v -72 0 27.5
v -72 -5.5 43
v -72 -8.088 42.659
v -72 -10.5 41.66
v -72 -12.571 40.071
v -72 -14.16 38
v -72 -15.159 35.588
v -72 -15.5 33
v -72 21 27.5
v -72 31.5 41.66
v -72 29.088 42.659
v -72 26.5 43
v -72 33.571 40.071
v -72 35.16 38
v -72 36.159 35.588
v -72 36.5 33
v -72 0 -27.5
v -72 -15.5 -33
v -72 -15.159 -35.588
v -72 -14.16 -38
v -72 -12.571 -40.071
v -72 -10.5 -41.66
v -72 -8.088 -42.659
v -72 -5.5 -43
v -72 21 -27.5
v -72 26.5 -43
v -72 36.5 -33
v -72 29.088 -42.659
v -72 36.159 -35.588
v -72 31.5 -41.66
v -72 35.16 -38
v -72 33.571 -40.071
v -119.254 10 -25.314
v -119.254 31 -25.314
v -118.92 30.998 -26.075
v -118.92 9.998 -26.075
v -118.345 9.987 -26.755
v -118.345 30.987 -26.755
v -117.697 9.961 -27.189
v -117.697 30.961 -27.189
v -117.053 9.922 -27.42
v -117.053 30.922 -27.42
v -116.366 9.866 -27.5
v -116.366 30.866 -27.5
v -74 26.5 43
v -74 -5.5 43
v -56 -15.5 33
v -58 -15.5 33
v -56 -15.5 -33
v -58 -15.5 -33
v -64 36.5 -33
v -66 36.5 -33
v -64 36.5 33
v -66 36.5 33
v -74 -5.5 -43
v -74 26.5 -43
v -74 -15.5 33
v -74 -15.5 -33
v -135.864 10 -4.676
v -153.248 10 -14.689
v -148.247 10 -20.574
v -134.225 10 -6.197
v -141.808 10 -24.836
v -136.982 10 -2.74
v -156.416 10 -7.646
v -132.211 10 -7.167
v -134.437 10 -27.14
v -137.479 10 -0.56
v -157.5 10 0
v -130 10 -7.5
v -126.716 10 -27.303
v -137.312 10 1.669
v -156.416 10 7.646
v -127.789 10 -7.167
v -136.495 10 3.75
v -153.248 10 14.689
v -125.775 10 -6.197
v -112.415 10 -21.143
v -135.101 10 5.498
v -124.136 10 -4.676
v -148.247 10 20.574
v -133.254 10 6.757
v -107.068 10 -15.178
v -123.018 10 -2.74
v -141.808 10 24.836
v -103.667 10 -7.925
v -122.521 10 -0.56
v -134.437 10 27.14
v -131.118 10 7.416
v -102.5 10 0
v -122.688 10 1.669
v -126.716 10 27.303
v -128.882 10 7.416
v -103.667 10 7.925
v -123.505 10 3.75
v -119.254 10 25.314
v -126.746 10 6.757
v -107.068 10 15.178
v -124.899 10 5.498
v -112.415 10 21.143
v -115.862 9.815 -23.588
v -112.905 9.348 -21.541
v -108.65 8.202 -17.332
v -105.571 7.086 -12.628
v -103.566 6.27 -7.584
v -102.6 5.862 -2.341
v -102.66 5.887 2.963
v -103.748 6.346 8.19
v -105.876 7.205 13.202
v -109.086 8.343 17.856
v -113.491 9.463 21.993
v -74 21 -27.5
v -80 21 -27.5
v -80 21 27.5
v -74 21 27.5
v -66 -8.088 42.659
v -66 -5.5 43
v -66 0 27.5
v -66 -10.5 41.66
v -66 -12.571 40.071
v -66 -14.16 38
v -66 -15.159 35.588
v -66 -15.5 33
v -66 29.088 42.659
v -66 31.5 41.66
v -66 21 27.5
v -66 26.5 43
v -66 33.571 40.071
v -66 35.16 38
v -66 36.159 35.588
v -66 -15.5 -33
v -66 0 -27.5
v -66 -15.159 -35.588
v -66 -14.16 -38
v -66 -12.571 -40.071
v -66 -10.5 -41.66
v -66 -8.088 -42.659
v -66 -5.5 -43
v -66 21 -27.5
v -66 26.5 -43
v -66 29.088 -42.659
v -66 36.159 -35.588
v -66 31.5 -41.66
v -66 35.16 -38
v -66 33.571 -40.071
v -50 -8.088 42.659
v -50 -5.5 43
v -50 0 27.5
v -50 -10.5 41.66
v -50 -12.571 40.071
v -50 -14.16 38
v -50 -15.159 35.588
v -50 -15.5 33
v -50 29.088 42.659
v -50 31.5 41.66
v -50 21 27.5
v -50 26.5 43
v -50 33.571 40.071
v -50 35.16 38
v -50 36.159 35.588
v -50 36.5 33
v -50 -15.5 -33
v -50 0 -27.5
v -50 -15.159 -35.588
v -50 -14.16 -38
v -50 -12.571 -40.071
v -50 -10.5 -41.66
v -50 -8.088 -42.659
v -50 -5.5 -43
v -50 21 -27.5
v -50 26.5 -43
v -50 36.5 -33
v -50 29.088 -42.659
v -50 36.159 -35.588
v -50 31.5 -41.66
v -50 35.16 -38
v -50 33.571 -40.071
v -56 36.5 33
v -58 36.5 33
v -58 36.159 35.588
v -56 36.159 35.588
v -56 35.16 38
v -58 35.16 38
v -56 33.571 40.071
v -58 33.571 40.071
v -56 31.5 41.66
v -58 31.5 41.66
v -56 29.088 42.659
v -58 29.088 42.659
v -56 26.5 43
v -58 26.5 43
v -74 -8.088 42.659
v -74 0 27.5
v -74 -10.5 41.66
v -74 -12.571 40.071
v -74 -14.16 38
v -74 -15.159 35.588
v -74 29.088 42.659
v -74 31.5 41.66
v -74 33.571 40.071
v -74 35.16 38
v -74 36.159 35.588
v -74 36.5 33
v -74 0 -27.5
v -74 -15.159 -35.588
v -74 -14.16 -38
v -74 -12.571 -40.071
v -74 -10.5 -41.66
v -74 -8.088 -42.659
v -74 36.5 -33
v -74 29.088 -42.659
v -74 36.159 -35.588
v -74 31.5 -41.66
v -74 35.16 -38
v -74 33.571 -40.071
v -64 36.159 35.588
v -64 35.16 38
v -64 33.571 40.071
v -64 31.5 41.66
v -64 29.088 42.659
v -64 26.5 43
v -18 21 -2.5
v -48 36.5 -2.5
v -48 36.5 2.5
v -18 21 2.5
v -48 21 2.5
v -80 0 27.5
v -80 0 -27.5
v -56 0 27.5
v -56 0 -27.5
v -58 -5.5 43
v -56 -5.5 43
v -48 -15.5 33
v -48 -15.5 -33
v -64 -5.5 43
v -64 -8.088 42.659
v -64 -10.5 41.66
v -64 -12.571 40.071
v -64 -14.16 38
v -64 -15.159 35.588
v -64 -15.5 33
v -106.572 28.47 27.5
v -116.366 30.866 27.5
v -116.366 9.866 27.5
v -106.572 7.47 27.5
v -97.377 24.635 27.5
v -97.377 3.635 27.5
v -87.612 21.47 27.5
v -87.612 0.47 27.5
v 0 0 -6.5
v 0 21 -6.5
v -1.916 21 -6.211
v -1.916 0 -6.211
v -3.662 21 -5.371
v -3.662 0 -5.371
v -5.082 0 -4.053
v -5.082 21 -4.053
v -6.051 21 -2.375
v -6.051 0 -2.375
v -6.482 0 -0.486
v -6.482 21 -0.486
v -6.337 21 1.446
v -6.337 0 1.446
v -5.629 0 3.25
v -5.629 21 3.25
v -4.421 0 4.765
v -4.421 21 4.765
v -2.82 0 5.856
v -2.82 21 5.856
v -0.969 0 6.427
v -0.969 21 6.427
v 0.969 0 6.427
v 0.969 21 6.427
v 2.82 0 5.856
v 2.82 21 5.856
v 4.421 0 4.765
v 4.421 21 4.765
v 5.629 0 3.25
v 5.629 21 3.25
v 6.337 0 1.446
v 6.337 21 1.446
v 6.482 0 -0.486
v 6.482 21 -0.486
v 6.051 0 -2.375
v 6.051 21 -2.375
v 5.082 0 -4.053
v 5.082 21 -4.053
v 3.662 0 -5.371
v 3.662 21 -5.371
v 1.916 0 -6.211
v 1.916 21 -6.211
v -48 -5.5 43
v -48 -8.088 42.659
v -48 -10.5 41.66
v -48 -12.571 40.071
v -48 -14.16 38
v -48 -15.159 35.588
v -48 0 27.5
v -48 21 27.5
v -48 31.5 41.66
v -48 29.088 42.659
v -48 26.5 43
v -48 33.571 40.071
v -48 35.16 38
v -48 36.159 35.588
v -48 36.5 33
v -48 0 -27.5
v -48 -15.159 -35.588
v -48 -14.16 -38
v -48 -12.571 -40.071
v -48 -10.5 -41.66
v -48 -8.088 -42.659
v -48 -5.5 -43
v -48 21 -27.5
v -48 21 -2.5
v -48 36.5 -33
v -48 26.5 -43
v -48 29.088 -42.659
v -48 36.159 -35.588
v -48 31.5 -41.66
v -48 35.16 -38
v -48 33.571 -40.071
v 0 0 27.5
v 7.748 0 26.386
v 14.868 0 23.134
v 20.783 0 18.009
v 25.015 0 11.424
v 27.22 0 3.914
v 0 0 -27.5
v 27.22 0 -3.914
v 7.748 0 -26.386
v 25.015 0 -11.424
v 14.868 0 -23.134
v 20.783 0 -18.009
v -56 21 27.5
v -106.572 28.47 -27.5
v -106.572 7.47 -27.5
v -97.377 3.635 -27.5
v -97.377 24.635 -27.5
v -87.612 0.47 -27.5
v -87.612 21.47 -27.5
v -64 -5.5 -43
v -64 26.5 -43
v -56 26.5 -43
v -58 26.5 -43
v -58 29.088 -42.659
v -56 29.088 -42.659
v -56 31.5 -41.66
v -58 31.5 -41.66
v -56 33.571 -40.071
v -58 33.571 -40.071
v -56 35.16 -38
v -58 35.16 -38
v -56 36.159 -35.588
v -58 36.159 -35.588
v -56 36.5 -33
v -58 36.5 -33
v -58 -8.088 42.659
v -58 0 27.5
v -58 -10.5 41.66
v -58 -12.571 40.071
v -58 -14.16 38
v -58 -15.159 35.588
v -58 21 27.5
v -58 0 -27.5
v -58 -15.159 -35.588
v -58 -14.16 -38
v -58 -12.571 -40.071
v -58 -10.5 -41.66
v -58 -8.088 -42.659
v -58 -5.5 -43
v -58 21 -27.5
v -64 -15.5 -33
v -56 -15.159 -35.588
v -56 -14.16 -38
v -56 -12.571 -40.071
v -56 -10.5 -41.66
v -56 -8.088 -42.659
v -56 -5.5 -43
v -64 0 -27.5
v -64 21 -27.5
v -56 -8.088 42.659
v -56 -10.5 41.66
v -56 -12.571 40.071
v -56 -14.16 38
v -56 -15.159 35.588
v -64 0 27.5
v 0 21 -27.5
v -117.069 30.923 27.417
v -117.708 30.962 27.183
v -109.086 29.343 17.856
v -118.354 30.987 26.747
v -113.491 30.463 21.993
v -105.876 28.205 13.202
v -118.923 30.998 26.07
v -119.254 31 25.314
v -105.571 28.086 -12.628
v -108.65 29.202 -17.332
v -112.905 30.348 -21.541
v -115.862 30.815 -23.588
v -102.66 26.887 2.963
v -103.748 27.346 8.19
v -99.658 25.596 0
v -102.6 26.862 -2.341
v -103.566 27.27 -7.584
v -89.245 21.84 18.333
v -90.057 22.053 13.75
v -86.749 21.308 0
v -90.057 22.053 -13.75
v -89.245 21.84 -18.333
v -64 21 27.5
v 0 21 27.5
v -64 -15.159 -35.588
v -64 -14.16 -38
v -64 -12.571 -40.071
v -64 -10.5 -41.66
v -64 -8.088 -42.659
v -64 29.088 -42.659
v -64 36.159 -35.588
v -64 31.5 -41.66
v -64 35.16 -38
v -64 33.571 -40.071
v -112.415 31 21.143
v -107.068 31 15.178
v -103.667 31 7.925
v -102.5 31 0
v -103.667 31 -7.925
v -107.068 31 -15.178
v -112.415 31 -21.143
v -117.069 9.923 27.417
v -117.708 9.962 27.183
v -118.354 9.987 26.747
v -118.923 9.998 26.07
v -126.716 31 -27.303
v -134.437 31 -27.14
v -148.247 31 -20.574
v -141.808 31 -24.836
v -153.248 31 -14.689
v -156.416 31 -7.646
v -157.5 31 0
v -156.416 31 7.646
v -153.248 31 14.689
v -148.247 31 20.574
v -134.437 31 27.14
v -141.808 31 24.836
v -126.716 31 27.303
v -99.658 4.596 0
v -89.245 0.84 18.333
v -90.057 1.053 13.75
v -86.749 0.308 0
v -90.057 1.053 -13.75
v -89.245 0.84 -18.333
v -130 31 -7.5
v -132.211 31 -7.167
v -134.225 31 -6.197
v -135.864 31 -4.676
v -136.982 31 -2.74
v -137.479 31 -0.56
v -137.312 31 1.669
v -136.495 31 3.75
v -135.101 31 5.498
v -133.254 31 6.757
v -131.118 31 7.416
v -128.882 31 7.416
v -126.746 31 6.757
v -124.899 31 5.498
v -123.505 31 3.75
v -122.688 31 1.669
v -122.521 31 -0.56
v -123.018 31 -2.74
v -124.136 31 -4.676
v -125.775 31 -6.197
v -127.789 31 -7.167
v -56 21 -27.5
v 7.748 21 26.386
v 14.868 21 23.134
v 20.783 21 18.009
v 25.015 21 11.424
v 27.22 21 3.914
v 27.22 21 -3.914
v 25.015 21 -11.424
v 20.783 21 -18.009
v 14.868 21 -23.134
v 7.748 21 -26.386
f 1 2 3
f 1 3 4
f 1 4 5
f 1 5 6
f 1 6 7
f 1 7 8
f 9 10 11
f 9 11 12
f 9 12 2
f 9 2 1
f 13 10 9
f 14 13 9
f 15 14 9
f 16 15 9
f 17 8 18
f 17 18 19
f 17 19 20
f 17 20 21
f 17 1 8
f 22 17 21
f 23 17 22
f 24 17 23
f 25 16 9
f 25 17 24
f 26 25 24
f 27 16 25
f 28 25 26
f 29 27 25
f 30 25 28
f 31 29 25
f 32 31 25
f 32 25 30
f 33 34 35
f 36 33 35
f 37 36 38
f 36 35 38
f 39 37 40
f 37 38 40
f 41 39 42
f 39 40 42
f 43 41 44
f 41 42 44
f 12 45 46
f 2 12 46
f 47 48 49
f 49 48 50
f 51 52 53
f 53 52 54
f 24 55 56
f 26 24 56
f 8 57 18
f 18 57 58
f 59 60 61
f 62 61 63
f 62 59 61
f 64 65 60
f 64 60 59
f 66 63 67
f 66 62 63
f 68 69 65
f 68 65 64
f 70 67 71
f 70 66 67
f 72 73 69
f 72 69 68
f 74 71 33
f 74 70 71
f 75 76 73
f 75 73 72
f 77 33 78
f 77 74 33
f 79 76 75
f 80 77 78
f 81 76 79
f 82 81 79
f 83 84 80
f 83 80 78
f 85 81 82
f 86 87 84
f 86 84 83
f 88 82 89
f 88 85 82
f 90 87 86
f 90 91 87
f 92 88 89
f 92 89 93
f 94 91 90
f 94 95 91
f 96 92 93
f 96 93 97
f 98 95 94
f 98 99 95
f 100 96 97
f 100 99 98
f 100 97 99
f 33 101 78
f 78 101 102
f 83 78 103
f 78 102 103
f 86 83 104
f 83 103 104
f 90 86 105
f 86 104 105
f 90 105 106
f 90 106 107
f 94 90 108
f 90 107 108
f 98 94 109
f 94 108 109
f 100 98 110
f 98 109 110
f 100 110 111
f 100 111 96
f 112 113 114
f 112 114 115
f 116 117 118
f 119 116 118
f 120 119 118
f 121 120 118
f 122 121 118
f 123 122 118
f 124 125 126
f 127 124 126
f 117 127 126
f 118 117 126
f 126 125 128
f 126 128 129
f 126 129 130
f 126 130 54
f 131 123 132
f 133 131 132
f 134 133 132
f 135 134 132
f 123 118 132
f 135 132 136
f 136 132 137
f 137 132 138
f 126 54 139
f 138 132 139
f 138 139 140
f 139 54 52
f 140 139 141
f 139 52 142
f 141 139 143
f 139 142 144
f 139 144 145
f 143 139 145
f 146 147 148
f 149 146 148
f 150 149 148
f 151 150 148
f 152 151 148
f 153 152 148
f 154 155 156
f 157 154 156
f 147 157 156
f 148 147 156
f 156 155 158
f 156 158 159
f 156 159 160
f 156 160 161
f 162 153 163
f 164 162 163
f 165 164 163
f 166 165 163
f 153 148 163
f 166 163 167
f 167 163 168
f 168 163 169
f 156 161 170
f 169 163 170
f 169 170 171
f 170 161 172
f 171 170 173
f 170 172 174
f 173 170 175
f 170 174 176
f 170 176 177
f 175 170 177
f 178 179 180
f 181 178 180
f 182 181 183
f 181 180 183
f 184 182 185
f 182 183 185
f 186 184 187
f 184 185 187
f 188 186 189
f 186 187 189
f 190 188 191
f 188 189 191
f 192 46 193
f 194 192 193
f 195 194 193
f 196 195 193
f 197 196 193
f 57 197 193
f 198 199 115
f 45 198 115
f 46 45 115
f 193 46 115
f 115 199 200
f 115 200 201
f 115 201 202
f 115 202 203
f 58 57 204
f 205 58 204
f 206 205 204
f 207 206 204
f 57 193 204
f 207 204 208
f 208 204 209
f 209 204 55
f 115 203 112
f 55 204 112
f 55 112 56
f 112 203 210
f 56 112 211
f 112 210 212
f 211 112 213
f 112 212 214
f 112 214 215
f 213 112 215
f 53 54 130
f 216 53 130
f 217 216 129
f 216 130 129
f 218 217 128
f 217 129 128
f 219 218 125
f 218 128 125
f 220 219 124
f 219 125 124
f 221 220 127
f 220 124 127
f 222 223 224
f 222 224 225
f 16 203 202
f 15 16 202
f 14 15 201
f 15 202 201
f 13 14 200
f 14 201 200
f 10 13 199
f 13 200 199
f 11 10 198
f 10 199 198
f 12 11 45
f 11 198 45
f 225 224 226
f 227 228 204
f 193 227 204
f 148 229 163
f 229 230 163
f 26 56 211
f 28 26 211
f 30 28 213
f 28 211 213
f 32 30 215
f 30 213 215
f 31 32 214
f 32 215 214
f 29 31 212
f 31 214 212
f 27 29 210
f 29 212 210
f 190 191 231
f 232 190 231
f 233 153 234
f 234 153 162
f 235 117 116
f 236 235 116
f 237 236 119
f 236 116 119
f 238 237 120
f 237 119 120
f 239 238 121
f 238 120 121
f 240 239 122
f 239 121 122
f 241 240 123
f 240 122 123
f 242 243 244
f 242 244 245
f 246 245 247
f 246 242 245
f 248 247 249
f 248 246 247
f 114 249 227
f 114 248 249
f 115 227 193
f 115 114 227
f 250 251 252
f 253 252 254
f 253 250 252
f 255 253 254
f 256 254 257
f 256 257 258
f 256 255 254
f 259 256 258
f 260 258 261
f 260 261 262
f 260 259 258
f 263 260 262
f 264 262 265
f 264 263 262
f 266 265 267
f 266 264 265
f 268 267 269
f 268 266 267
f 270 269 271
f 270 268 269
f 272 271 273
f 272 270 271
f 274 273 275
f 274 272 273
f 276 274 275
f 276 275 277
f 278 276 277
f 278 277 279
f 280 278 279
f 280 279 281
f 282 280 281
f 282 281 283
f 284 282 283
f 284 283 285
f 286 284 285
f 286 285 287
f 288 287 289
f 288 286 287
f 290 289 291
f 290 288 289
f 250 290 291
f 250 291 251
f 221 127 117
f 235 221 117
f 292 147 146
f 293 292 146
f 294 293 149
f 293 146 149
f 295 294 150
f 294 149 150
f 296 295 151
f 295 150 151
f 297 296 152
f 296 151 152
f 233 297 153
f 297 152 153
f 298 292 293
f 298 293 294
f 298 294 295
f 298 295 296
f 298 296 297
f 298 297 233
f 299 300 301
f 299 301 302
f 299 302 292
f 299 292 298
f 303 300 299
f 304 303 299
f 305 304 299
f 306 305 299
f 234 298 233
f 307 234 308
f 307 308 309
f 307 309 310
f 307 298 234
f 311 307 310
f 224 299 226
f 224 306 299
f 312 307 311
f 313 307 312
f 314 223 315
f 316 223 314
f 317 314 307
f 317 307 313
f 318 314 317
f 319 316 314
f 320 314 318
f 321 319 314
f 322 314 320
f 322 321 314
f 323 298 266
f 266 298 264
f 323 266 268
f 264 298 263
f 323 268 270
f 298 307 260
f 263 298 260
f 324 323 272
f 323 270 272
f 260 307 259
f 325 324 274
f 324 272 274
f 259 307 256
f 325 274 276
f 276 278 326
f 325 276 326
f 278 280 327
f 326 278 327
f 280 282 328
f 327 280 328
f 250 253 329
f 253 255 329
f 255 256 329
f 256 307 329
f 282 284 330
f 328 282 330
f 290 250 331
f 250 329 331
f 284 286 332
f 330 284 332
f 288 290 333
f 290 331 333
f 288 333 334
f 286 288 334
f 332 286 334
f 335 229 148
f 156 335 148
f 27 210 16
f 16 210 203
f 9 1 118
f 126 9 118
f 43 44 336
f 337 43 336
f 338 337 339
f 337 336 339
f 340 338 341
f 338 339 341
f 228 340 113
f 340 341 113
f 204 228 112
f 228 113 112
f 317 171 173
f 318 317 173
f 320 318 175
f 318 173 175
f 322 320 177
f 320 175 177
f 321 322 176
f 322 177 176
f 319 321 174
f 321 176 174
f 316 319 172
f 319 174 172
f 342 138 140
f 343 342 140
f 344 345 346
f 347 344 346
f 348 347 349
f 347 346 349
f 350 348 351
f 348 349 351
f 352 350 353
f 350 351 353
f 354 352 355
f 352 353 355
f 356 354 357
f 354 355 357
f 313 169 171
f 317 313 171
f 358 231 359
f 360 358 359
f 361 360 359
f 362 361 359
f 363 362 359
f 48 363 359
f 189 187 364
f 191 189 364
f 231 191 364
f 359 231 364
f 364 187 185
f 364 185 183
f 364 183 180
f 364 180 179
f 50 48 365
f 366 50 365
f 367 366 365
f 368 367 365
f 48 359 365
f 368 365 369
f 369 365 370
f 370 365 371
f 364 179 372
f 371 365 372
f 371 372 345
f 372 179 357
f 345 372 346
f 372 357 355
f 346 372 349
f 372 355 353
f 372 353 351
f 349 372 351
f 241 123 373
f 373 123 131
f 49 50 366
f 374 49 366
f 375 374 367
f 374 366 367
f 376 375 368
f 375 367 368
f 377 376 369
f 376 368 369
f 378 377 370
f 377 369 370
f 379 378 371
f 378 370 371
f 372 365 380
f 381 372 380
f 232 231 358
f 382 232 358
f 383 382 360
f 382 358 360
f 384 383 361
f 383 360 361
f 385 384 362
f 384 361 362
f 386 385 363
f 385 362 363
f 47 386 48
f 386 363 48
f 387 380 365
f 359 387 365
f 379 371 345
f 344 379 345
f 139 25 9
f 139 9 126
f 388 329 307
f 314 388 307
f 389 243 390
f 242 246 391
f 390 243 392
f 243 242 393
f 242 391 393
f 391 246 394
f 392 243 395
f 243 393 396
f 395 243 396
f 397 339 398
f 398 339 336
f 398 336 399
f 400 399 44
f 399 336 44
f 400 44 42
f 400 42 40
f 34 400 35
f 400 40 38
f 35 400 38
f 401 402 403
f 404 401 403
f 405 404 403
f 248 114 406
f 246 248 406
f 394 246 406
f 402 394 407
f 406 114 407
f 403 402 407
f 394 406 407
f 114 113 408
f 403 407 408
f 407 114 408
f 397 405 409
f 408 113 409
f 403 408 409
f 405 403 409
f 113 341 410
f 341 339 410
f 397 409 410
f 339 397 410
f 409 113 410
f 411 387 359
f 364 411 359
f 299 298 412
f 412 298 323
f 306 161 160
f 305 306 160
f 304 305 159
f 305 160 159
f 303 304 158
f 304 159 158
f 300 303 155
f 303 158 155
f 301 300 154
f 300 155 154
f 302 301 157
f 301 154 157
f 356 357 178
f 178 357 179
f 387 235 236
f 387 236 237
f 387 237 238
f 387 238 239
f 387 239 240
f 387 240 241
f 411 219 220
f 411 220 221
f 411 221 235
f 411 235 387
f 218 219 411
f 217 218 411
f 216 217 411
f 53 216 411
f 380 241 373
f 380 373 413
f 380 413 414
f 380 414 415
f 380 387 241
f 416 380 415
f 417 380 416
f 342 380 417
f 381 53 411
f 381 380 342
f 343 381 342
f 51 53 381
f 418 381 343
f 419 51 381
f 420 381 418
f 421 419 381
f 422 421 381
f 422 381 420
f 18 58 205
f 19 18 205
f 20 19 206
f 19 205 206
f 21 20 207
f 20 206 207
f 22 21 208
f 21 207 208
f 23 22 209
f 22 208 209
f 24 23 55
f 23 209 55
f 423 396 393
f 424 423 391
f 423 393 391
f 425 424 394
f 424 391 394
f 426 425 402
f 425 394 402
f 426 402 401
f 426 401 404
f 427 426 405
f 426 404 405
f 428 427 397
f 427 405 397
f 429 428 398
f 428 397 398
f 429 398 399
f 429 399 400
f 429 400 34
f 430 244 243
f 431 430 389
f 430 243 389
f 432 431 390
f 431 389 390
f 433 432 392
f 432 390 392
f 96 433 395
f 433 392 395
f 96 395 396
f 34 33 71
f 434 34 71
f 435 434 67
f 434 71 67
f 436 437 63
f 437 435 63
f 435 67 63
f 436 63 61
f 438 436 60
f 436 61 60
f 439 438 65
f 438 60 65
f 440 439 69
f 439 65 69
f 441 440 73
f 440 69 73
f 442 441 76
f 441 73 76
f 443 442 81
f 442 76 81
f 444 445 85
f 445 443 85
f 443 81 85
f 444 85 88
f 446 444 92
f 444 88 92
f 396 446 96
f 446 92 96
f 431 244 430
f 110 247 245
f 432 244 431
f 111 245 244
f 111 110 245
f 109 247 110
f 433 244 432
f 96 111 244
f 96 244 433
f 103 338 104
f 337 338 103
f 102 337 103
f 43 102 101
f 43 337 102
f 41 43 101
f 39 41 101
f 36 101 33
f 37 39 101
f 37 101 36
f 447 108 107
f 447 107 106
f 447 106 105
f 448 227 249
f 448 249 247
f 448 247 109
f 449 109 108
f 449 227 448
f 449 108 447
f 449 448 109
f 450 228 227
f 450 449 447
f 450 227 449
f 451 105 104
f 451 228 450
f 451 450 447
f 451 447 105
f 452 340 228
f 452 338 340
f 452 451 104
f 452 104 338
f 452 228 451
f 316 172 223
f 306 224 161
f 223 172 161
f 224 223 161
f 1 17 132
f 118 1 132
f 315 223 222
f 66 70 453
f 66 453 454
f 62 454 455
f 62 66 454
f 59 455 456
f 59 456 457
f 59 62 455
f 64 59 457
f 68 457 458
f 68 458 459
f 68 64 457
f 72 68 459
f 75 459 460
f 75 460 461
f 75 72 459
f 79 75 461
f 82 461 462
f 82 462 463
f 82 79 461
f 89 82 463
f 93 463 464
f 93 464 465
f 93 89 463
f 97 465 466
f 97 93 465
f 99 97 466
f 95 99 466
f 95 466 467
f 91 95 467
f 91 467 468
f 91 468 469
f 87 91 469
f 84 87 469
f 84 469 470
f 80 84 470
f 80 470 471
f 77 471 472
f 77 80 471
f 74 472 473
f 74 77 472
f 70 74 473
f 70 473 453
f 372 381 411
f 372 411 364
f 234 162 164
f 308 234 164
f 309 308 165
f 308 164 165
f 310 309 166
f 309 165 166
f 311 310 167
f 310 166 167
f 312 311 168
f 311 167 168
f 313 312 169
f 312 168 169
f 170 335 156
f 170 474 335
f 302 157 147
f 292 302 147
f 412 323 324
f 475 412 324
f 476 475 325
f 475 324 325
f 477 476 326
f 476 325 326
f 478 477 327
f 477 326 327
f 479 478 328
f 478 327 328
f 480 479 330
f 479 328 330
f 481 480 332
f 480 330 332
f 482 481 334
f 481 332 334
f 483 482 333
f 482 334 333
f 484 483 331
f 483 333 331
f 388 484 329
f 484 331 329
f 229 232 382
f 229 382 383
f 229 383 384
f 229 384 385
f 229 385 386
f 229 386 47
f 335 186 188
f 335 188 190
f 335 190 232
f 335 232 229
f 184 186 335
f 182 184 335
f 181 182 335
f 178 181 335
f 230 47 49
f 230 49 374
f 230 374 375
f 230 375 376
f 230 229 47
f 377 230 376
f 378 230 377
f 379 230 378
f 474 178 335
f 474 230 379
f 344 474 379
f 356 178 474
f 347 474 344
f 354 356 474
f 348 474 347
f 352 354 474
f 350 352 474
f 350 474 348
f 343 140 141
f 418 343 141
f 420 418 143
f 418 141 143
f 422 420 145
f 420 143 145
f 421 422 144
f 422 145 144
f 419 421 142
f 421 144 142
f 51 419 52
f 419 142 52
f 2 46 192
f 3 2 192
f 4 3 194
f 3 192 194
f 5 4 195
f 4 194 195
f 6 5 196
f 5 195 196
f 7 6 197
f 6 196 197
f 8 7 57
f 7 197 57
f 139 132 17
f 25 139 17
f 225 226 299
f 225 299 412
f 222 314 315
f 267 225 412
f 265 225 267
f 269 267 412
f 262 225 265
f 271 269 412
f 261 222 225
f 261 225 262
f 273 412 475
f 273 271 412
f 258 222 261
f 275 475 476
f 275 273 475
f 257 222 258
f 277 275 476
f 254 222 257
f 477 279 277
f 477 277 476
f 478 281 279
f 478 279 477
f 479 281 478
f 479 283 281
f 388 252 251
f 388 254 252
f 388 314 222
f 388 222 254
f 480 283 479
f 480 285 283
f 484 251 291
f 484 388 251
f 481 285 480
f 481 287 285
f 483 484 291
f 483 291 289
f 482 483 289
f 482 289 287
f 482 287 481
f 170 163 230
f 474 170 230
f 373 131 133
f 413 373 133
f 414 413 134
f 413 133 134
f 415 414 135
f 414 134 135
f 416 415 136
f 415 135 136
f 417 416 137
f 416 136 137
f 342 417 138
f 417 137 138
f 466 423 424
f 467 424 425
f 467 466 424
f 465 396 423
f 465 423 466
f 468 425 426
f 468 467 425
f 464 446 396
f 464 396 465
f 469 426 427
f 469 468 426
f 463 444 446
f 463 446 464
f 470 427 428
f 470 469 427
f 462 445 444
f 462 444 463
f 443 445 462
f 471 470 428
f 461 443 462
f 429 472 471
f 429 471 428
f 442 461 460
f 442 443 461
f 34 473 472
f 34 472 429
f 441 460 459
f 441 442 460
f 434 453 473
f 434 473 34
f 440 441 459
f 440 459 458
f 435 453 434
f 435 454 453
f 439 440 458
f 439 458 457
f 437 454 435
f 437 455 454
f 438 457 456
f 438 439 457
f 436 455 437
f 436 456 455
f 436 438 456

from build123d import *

# Parameters (mm, degrees)
SKETCH1_R           = 6.5
BOSS_EXTRUDE1_DEPTH = 21
BOSS_EXTRUDE2_START = -50
SKETCH3_W           = 55
SKETCH3_H           = 21
BOSS_EXTRUDE2_DEPTH = 2
LPATTERN1_COUNT     = 4
LPATTERN1_PITCH     = 8
SKETCH4_R           = 27.5
SKETCH4_R_2         = 7.5
BOSS_EXTRUDE3_DEPTH = 21
SWEEP1_START        = -27.5
SWEEP1_DEPTH        = 55
FILLET1_R           = 3
CUT_EXTRUDE1_START  = 21
CUT_EXTRUDE1_DEPTH  = 21
RIB4_REACH          = 169.295
SKETCH9_WALL_W      = 370.356888496
SKETCH9_WALL_H      = 5


# Read off the part's stored shape, not the designer's step: Sweep1
with BuildPart() as part:
    # Sketch1 → Boss-Extrude1 (new body)
    with BuildSketch(Plane(origin=(0, 0, 0), x_dir=(1, 0, 0), z_dir=(0, 1, 0))):
        with BuildLine():
            Line((0, 27.5), (-80, 27.5))
            Line((-80, 27.5), (-80, -27.5))
            Line((-80, -27.5), (0, -27.5))
            ThreePointArc((0, -27.5), (27.5, 0), (0, 27.5))
        make_face()
        with Locations(Location((0, 0, 0), (0, 0, 90))):
            Circle(SKETCH1_R, mode=Mode.SUBTRACT)
    extrude(amount=BOSS_EXTRUDE1_DEPTH)


with BuildPart() as body_2:
    # Sketch3 → Boss-Extrude2 (new body)
    with BuildSketch(Plane(origin=(0, 0, 0), x_dir=(0, 0, -1), z_dir=(1, 0, 0)).offset(BOSS_EXTRUDE2_START)):
        with BuildLine():
            Line((-33, -15.5), (33, -15.5))
            ThreePointArc((33, -15.5), (40.071067812, -12.571067812), (43, -5.5))
            Line((43, -5.5), (43, 26.5))
            ThreePointArc((43, 26.5), (40.071067812, 33.571067812), (33, 36.5))
            Line((33, 36.5), (-33, 36.5))
            ThreePointArc((-33, 36.5), (-40.071067812, 33.571067812), (-43, 26.5))
            Line((-43, 26.5), (-43, -5.5))
            ThreePointArc((-43, -5.5), (-40.071067812, -12.571067812), (-33, -15.5))
        make_face()
        with Locations((0, 10.5)):
            Rectangle(SKETCH3_W, SKETCH3_H, mode=Mode.SUBTRACT)
    boss_extrude2 = extrude(amount=BOSS_EXTRUDE2_DEPTH)


with BuildPart() as part_1:
    add(part.part)

    # LPattern1: Boss-Extrude2 ×4
    with Locations(*[(-i * LPATTERN1_PITCH, 0, 0) for i in range(1, LPATTERN1_COUNT)]):
        add(boss_extrude2)



with BuildPart() as body_3:
    # Sketch4 → Boss-Extrude3 (new body)
    with BuildSketch(Plane(origin=(0, 10, 0), x_dir=(1, 0, 0), z_dir=(0, 1, 0))):
        with Locations(Location((-130, 0, 0), (0, 0, 90))):
            Circle(SKETCH4_R)
        with Locations(Location((-130, 0, 0), (0, 0, 90))):
            Circle(SKETCH4_R_2, mode=Mode.SUBTRACT)
    extrude(amount=BOSS_EXTRUDE3_DEPTH)


with BuildPart() as part_2:
    add(part_1.part)

    add(body_3.part)  # Sweep1 merges body 3
    # Sweep1 outline → Sweep1 (add)
    with BuildSketch(Plane.XY.offset(SWEEP1_START)):
        with BuildLine():
            Line((-80, 0), (-80, 21))
            add(Edge.make_bspline(
                [(-80, 21), (-86.827647421, 20.344373746), (-93.439203359, 22.931124684), (-105.876424342, 28.26148667), (-111.667729409, 30.999999996), (-119.254055637, 31)],
                knots=[0, 0, 0, 0, 0.5, 0.5, 1, 1, 1, 1], degree=3))
            Line((-119.254055637, 31), (-119.254055637, 10))
            add(Edge.make_bspline(
                [(-80, 0), (-86.827647421, -0.655626254), (-93.439203359, 1.931124684), (-105.876424342, 7.26148667), (-111.667729409, 9.999999996), (-119.254055637, 10)],
                knots=[0, 0, 0, 0, 0.5, 0.5, 1, 1, 1, 1], degree=3))
        make_face()
    extrude(amount=SWEEP1_DEPTH)

    # Fillet1
    # the kernel refuses this fillet: 3 mm, written as the material it takes off along each edge
    with BuildSketch(Plane(origin=(-119.254055637, 38.218973628, -27.5), x_dir=(0, 0, 1), z_dir=(0, -1, 0))) as fillet1_piece_1_section:
        with BuildLine():
            CenterArc((3, -2.887589451), FILLET1_R, 105.734249822, 74.265750178)
            Line((0, -2.887589451), (-0.06, -2.887589451))
            Line((-0.06, -2.887589451), (-0.06, 0))
            Line((-0.06, 0), (0, 0.06))
            ThreePointArc((0, 0.06), (1.093236198, 0.06), (2.170201844, 0.057751789))
            Line((2.170201844, 0.057751789), (2.186472396, 0))
        make_face()
    fillet1_piece_1 = extrude(amount=35.437947255, mode=Mode.PRIVATE)
    fillet1_piece_1 = fillet1_piece_1 - Plane(origin=(-130, 20.5, 0), x_dir=(0, 0, -1), z_dir=(0, -1, 0)) * Cylinder(27.5, 83, mode=Mode.PRIVATE)
    add(fillet1_piece_1, mode=Mode.SUBTRACT)
    with BuildSketch(Plane(origin=(-119.254055637, 38.218973628, 27.5), x_dir=(0, 0, -1), z_dir=(0, -1, 0))) as fillet1_piece_2_section:
        with BuildLine():
            CenterArc((3, 2.887589451), FILLET1_R, 180, 74.265750178)
            Line((0, 2.887589451), (-0.06, 2.887589451))
            Line((-0.06, 2.887589451), (-0.06, 0))
            Line((-0.06, 0), (0, -0.06))
            ThreePointArc((0, -0.06), (1.093236198, -0.06), (2.170201844, -0.057751789))
            Line((2.170201844, -0.057751789), (2.186472396, 0))
        make_face()
    fillet1_piece_2 = extrude(amount=35.437947255, mode=Mode.PRIVATE)
    fillet1_piece_2 = fillet1_piece_2 - Plane(origin=(-130, 20.5, 0), x_dir=(0, 0, -1), z_dir=(0, -1, 0)) * Cylinder(27.5, 83, mode=Mode.PRIVATE)
    add(fillet1_piece_2, mode=Mode.SUBTRACT)

    # Sketch7 → Cut-Extrude1 (cut)
    with BuildSketch(Plane.XZ.offset(-10).offset(CUT_EXTRUDE1_START)):
        with BuildLine():
            ThreePointArc((-119.254055637, 25.313527604), (-157.5, 0), (-119.254055637, -25.313527604))
            ThreePointArc((-119.254055637, -25.313527604), (-102.5, 0), (-119.254055637, 25.313527604))
        make_face()
    extrude(amount=-CUT_EXTRUDE1_DEPTH, mode=Mode.SUBTRACT)


with BuildPart() as body_2_1:
    add(body_2.part)

    # Combine1: union part
    add(part_2.part)

    # Sketch9 wall → Rib4 (add, up to next)
    with BuildSketch(Plane(origin=(-33, 28.75, 0), x_dir=(0.888425906857, -0.459020051876, 0), z_dir=(0.459020051876, 0.888425906857, 0)), mode=Mode.PRIVATE) as rib4_sk1:
        Rectangle(SKETCH9_WALL_W, SKETCH9_WALL_H)
    rib4_tool1 = extrude(rib4_sk1.sketch, amount=-RIB4_REACH, mode=Mode.PRIVATE) - body_2_1.part
    add(rib4_tool1.solids().sort_by_distance((-33, 28.75, 0))[0])


solid = body_2_1.part
